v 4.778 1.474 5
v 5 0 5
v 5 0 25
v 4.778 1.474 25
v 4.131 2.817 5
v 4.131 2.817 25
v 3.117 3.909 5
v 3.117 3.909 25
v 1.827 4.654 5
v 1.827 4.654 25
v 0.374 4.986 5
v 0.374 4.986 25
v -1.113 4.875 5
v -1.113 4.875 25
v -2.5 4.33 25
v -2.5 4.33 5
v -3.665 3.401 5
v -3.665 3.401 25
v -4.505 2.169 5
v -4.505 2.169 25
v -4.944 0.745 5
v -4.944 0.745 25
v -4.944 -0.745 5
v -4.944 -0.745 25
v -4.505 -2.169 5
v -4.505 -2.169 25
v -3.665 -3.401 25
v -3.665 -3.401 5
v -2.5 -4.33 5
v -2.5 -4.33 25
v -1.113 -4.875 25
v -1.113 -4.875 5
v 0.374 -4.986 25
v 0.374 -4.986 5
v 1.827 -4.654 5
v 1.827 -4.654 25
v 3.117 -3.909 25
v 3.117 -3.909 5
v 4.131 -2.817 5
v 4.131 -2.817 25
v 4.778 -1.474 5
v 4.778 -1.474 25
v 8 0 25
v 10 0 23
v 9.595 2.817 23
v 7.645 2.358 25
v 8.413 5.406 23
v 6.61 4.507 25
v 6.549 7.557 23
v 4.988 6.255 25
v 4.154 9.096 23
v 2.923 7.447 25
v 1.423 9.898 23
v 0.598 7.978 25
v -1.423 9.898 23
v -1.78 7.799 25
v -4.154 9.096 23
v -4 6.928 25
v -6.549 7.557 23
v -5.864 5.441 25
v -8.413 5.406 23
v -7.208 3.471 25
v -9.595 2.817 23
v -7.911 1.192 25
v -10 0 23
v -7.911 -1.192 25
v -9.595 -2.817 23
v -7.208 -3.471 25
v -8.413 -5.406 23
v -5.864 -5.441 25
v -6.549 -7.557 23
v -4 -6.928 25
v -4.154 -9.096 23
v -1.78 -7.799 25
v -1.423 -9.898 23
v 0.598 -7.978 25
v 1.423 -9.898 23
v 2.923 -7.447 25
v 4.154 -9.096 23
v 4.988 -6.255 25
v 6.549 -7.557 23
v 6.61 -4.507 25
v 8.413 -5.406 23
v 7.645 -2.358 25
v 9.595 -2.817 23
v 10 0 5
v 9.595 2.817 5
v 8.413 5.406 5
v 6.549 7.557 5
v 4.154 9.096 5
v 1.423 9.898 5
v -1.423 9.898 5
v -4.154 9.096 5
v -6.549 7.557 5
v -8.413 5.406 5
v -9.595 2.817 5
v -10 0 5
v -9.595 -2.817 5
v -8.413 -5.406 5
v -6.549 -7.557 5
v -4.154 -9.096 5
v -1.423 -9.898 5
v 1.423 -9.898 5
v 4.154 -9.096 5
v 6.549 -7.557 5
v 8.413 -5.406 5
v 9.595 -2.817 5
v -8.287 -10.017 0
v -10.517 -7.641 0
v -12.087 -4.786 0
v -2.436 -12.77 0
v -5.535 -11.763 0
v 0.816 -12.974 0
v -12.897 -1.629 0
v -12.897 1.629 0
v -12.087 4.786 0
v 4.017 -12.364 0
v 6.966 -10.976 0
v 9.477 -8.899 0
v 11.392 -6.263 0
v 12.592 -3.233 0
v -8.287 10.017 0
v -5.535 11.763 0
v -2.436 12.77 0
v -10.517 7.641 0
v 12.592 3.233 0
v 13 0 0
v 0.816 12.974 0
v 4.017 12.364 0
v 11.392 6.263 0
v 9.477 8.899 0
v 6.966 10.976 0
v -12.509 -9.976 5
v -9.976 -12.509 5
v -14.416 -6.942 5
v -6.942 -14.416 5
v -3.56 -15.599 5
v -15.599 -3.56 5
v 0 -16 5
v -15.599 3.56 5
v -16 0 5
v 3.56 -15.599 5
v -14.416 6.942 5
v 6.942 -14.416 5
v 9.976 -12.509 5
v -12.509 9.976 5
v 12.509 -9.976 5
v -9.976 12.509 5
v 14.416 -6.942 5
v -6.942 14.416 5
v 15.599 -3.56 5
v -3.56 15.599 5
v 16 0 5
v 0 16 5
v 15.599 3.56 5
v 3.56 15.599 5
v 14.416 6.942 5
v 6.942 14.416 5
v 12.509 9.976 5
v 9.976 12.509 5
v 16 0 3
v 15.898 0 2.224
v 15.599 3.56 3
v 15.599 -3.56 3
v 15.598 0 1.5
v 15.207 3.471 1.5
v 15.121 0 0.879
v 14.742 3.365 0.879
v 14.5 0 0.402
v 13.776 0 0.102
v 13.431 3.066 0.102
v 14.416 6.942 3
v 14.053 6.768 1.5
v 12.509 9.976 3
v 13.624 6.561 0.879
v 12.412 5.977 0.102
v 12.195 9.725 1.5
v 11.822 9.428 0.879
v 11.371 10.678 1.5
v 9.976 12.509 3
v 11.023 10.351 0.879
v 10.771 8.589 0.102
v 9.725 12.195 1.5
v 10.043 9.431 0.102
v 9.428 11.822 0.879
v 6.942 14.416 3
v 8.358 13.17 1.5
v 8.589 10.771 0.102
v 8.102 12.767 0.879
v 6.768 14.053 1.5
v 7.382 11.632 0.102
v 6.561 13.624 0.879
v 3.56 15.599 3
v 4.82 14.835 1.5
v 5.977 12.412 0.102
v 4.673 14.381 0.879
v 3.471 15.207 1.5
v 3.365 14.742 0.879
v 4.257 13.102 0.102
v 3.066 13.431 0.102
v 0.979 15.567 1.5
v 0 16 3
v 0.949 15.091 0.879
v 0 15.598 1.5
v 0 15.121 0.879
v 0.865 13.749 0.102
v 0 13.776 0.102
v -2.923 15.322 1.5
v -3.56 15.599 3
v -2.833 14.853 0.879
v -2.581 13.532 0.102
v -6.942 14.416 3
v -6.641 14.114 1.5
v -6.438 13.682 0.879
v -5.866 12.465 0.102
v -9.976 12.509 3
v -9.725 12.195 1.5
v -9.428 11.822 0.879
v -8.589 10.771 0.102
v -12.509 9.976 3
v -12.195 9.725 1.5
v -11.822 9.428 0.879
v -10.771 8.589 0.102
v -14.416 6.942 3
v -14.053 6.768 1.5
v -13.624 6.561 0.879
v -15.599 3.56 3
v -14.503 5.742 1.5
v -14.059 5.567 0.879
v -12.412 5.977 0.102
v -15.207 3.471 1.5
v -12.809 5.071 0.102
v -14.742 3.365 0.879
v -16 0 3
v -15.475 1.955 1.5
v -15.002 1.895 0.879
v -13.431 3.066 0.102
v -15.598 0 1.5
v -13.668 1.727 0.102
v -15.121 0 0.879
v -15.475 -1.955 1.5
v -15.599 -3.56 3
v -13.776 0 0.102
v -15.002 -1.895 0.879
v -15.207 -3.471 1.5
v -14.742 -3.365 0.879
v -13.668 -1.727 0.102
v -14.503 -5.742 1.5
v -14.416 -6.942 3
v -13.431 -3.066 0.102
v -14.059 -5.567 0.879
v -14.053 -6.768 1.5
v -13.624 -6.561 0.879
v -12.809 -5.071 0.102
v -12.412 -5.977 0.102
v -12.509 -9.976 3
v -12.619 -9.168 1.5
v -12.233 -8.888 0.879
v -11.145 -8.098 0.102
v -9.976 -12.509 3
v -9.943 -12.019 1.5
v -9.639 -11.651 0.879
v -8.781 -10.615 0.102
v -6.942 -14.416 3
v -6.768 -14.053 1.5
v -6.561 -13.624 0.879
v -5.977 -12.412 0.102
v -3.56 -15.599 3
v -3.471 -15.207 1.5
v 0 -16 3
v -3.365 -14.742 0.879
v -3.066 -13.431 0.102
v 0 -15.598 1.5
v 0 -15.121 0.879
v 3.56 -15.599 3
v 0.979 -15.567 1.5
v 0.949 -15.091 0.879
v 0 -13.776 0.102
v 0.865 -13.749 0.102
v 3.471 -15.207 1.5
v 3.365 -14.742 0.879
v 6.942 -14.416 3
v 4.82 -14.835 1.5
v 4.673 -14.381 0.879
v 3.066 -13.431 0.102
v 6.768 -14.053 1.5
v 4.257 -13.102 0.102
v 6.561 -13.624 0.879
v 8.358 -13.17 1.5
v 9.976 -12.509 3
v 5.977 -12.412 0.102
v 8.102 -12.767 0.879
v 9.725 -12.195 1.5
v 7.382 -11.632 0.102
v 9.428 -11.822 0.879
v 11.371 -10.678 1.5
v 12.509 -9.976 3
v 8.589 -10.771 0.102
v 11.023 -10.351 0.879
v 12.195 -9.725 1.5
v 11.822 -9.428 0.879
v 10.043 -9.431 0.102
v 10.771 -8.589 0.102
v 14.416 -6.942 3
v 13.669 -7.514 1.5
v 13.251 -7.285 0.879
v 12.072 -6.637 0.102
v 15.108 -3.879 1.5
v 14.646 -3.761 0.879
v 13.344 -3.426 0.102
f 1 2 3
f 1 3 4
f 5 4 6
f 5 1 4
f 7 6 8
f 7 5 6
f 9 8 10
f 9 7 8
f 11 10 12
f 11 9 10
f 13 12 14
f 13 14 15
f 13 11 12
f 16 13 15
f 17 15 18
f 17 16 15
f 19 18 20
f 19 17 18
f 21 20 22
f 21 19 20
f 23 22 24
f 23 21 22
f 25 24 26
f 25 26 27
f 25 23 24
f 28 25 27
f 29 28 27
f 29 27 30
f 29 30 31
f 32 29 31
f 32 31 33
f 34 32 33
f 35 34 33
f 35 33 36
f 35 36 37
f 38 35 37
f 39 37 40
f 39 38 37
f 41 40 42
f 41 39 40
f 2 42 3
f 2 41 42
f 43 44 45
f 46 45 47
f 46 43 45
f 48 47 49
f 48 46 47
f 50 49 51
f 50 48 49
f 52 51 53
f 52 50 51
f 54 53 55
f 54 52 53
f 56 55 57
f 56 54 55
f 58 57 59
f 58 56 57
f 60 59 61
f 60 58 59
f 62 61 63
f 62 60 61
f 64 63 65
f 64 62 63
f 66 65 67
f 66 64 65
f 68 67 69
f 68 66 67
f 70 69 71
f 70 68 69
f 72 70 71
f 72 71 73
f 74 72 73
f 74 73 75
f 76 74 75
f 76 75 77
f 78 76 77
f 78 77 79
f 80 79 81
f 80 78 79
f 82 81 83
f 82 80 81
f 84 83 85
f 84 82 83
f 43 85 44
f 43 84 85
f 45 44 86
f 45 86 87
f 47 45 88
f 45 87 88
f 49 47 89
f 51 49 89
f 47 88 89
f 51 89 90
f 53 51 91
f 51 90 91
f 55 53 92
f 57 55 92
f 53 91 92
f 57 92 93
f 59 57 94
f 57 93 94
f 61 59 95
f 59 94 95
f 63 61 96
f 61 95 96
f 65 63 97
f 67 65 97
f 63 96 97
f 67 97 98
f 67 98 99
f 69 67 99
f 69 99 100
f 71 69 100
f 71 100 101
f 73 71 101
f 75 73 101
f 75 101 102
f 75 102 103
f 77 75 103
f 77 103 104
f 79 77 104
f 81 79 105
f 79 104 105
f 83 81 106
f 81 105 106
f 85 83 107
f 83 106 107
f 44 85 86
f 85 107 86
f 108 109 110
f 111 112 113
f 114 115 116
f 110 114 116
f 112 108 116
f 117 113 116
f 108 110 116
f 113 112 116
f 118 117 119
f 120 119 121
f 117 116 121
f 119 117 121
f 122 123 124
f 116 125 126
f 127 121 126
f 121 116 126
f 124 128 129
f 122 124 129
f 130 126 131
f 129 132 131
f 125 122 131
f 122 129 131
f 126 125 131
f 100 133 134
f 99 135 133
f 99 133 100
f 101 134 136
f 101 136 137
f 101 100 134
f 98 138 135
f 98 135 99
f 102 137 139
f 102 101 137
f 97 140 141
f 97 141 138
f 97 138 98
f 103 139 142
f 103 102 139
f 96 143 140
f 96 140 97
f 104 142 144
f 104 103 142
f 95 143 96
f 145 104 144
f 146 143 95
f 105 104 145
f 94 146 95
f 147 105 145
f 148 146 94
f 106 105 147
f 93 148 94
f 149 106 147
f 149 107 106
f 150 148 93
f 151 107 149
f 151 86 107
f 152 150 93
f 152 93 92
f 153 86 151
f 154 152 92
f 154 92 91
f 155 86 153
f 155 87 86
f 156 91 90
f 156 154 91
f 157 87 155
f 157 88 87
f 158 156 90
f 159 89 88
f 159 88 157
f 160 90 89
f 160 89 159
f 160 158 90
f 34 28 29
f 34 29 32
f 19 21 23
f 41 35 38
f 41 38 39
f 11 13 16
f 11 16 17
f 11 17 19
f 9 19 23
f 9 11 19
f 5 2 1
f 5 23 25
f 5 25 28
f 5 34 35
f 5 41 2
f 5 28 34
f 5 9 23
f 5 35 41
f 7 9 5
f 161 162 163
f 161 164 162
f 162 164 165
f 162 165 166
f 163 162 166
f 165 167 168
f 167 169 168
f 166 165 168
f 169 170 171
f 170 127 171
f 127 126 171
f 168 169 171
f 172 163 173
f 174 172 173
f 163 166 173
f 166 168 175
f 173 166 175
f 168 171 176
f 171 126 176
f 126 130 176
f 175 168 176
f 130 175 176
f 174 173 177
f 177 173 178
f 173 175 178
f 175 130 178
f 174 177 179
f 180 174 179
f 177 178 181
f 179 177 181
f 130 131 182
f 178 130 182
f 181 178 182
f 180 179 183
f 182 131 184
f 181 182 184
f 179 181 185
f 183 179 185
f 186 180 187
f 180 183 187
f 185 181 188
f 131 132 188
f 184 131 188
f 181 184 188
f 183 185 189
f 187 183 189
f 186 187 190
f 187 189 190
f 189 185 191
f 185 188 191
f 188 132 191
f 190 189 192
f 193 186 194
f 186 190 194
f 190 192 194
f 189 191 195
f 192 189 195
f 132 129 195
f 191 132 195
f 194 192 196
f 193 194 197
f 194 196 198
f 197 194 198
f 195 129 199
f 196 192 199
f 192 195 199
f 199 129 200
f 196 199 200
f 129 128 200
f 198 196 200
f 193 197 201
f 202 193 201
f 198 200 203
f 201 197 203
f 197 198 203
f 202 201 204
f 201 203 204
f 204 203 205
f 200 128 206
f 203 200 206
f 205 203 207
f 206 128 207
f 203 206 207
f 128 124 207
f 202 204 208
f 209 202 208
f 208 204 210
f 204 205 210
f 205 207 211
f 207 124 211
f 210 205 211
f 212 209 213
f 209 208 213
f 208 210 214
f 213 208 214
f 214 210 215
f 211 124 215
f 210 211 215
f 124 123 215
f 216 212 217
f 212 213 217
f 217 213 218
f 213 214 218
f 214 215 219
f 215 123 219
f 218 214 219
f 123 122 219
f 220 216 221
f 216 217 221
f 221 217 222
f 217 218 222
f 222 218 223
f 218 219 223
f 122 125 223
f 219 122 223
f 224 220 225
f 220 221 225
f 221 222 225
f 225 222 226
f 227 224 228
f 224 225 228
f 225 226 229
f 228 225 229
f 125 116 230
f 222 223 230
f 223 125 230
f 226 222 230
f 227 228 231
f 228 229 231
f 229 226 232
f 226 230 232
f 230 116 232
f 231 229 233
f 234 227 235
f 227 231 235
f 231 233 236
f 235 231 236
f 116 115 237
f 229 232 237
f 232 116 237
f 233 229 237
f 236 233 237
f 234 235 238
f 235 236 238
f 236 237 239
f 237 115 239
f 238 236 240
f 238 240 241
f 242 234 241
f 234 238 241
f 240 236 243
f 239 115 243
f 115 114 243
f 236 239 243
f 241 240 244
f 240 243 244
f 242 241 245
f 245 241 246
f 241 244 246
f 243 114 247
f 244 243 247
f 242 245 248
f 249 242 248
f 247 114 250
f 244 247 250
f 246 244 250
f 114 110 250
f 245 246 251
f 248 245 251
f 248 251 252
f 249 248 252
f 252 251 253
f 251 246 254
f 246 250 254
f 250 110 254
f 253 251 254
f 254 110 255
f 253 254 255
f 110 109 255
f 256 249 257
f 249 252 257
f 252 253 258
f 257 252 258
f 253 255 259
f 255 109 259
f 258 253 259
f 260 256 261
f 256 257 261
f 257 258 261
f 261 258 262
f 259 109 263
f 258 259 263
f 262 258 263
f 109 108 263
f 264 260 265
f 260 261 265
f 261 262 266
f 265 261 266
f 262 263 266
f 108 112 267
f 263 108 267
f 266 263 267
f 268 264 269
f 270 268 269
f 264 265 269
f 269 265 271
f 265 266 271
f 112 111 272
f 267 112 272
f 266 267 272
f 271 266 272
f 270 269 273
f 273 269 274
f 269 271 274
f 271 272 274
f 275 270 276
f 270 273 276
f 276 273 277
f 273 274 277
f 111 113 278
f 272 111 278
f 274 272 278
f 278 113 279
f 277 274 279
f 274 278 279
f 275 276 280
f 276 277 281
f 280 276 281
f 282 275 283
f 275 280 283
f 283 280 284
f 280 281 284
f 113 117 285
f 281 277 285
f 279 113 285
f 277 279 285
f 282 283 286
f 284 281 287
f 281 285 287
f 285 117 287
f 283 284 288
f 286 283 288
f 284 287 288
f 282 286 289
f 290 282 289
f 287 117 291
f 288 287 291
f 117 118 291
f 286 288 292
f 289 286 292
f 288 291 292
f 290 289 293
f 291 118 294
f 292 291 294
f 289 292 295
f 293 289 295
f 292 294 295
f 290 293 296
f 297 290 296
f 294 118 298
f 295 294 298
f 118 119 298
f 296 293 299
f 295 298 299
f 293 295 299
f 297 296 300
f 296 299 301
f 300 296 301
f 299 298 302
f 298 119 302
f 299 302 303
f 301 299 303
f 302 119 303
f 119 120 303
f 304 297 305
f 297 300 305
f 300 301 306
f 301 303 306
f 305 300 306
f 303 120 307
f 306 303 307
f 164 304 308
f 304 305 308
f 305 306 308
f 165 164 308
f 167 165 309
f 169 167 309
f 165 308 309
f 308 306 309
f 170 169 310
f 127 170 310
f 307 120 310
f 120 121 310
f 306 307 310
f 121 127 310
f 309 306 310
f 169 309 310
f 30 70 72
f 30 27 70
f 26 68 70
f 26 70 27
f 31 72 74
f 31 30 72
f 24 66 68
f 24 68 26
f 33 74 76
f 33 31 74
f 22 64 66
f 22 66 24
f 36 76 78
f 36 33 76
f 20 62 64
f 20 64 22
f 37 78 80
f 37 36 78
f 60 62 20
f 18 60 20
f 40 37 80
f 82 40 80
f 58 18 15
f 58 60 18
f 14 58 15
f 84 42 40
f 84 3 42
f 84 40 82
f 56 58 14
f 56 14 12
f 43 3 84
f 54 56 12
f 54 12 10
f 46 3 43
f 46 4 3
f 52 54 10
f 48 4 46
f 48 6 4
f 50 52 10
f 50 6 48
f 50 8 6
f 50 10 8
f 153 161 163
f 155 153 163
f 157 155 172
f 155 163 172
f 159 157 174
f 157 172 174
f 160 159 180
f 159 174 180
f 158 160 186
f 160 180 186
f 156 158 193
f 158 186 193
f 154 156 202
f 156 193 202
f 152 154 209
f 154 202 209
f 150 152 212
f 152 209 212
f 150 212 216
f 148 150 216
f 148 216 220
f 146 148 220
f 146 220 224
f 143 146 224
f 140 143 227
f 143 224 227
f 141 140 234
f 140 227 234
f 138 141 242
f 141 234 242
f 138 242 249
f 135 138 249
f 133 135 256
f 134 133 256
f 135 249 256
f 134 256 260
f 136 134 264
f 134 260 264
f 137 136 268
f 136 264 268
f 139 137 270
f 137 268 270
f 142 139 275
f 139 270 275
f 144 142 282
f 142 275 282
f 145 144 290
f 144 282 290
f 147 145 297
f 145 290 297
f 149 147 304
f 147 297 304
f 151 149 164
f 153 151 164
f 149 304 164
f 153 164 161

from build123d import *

# Parameters (mm, degrees)
SKETCH_R      = 16
PAD_DEPTH     = 5
SKETCH001_R   = 10
SKETCH001_R_2 = 5
PAD001_DEPTH  = 20
FILLET_R      = 3
CHAMFER_SIZE  = 2


with BuildPart() as part:
    # Sketch → Pad (new body)
    with BuildSketch(Plane.XY):
        Circle(SKETCH_R)
    extrude(amount=PAD_DEPTH)

    # Sketch001 (on Face3 of Pad) → Pad001 (join)
    with BuildSketch(Plane.XY.offset(5)):
        Circle(SKETCH001_R)
        Circle(SKETCH001_R_2, mode=Mode.SUBTRACT)
    extrude(amount=PAD001_DEPTH)

    # Fillet
    fillet_edges = [part.edges().sort_by_distance(p)[0] for p in [
        (-16, 0, 0),
    ]]
    fillet(fillet_edges, radius=FILLET_R)

    # Chamfer
    chamfer_edges = [part.edges().sort_by_distance(p)[0] for p in [
        (-10, 0, 25),
    ]]
    chamfer(chamfer_edges, length=CHAMFER_SIZE)


solid = part.part
